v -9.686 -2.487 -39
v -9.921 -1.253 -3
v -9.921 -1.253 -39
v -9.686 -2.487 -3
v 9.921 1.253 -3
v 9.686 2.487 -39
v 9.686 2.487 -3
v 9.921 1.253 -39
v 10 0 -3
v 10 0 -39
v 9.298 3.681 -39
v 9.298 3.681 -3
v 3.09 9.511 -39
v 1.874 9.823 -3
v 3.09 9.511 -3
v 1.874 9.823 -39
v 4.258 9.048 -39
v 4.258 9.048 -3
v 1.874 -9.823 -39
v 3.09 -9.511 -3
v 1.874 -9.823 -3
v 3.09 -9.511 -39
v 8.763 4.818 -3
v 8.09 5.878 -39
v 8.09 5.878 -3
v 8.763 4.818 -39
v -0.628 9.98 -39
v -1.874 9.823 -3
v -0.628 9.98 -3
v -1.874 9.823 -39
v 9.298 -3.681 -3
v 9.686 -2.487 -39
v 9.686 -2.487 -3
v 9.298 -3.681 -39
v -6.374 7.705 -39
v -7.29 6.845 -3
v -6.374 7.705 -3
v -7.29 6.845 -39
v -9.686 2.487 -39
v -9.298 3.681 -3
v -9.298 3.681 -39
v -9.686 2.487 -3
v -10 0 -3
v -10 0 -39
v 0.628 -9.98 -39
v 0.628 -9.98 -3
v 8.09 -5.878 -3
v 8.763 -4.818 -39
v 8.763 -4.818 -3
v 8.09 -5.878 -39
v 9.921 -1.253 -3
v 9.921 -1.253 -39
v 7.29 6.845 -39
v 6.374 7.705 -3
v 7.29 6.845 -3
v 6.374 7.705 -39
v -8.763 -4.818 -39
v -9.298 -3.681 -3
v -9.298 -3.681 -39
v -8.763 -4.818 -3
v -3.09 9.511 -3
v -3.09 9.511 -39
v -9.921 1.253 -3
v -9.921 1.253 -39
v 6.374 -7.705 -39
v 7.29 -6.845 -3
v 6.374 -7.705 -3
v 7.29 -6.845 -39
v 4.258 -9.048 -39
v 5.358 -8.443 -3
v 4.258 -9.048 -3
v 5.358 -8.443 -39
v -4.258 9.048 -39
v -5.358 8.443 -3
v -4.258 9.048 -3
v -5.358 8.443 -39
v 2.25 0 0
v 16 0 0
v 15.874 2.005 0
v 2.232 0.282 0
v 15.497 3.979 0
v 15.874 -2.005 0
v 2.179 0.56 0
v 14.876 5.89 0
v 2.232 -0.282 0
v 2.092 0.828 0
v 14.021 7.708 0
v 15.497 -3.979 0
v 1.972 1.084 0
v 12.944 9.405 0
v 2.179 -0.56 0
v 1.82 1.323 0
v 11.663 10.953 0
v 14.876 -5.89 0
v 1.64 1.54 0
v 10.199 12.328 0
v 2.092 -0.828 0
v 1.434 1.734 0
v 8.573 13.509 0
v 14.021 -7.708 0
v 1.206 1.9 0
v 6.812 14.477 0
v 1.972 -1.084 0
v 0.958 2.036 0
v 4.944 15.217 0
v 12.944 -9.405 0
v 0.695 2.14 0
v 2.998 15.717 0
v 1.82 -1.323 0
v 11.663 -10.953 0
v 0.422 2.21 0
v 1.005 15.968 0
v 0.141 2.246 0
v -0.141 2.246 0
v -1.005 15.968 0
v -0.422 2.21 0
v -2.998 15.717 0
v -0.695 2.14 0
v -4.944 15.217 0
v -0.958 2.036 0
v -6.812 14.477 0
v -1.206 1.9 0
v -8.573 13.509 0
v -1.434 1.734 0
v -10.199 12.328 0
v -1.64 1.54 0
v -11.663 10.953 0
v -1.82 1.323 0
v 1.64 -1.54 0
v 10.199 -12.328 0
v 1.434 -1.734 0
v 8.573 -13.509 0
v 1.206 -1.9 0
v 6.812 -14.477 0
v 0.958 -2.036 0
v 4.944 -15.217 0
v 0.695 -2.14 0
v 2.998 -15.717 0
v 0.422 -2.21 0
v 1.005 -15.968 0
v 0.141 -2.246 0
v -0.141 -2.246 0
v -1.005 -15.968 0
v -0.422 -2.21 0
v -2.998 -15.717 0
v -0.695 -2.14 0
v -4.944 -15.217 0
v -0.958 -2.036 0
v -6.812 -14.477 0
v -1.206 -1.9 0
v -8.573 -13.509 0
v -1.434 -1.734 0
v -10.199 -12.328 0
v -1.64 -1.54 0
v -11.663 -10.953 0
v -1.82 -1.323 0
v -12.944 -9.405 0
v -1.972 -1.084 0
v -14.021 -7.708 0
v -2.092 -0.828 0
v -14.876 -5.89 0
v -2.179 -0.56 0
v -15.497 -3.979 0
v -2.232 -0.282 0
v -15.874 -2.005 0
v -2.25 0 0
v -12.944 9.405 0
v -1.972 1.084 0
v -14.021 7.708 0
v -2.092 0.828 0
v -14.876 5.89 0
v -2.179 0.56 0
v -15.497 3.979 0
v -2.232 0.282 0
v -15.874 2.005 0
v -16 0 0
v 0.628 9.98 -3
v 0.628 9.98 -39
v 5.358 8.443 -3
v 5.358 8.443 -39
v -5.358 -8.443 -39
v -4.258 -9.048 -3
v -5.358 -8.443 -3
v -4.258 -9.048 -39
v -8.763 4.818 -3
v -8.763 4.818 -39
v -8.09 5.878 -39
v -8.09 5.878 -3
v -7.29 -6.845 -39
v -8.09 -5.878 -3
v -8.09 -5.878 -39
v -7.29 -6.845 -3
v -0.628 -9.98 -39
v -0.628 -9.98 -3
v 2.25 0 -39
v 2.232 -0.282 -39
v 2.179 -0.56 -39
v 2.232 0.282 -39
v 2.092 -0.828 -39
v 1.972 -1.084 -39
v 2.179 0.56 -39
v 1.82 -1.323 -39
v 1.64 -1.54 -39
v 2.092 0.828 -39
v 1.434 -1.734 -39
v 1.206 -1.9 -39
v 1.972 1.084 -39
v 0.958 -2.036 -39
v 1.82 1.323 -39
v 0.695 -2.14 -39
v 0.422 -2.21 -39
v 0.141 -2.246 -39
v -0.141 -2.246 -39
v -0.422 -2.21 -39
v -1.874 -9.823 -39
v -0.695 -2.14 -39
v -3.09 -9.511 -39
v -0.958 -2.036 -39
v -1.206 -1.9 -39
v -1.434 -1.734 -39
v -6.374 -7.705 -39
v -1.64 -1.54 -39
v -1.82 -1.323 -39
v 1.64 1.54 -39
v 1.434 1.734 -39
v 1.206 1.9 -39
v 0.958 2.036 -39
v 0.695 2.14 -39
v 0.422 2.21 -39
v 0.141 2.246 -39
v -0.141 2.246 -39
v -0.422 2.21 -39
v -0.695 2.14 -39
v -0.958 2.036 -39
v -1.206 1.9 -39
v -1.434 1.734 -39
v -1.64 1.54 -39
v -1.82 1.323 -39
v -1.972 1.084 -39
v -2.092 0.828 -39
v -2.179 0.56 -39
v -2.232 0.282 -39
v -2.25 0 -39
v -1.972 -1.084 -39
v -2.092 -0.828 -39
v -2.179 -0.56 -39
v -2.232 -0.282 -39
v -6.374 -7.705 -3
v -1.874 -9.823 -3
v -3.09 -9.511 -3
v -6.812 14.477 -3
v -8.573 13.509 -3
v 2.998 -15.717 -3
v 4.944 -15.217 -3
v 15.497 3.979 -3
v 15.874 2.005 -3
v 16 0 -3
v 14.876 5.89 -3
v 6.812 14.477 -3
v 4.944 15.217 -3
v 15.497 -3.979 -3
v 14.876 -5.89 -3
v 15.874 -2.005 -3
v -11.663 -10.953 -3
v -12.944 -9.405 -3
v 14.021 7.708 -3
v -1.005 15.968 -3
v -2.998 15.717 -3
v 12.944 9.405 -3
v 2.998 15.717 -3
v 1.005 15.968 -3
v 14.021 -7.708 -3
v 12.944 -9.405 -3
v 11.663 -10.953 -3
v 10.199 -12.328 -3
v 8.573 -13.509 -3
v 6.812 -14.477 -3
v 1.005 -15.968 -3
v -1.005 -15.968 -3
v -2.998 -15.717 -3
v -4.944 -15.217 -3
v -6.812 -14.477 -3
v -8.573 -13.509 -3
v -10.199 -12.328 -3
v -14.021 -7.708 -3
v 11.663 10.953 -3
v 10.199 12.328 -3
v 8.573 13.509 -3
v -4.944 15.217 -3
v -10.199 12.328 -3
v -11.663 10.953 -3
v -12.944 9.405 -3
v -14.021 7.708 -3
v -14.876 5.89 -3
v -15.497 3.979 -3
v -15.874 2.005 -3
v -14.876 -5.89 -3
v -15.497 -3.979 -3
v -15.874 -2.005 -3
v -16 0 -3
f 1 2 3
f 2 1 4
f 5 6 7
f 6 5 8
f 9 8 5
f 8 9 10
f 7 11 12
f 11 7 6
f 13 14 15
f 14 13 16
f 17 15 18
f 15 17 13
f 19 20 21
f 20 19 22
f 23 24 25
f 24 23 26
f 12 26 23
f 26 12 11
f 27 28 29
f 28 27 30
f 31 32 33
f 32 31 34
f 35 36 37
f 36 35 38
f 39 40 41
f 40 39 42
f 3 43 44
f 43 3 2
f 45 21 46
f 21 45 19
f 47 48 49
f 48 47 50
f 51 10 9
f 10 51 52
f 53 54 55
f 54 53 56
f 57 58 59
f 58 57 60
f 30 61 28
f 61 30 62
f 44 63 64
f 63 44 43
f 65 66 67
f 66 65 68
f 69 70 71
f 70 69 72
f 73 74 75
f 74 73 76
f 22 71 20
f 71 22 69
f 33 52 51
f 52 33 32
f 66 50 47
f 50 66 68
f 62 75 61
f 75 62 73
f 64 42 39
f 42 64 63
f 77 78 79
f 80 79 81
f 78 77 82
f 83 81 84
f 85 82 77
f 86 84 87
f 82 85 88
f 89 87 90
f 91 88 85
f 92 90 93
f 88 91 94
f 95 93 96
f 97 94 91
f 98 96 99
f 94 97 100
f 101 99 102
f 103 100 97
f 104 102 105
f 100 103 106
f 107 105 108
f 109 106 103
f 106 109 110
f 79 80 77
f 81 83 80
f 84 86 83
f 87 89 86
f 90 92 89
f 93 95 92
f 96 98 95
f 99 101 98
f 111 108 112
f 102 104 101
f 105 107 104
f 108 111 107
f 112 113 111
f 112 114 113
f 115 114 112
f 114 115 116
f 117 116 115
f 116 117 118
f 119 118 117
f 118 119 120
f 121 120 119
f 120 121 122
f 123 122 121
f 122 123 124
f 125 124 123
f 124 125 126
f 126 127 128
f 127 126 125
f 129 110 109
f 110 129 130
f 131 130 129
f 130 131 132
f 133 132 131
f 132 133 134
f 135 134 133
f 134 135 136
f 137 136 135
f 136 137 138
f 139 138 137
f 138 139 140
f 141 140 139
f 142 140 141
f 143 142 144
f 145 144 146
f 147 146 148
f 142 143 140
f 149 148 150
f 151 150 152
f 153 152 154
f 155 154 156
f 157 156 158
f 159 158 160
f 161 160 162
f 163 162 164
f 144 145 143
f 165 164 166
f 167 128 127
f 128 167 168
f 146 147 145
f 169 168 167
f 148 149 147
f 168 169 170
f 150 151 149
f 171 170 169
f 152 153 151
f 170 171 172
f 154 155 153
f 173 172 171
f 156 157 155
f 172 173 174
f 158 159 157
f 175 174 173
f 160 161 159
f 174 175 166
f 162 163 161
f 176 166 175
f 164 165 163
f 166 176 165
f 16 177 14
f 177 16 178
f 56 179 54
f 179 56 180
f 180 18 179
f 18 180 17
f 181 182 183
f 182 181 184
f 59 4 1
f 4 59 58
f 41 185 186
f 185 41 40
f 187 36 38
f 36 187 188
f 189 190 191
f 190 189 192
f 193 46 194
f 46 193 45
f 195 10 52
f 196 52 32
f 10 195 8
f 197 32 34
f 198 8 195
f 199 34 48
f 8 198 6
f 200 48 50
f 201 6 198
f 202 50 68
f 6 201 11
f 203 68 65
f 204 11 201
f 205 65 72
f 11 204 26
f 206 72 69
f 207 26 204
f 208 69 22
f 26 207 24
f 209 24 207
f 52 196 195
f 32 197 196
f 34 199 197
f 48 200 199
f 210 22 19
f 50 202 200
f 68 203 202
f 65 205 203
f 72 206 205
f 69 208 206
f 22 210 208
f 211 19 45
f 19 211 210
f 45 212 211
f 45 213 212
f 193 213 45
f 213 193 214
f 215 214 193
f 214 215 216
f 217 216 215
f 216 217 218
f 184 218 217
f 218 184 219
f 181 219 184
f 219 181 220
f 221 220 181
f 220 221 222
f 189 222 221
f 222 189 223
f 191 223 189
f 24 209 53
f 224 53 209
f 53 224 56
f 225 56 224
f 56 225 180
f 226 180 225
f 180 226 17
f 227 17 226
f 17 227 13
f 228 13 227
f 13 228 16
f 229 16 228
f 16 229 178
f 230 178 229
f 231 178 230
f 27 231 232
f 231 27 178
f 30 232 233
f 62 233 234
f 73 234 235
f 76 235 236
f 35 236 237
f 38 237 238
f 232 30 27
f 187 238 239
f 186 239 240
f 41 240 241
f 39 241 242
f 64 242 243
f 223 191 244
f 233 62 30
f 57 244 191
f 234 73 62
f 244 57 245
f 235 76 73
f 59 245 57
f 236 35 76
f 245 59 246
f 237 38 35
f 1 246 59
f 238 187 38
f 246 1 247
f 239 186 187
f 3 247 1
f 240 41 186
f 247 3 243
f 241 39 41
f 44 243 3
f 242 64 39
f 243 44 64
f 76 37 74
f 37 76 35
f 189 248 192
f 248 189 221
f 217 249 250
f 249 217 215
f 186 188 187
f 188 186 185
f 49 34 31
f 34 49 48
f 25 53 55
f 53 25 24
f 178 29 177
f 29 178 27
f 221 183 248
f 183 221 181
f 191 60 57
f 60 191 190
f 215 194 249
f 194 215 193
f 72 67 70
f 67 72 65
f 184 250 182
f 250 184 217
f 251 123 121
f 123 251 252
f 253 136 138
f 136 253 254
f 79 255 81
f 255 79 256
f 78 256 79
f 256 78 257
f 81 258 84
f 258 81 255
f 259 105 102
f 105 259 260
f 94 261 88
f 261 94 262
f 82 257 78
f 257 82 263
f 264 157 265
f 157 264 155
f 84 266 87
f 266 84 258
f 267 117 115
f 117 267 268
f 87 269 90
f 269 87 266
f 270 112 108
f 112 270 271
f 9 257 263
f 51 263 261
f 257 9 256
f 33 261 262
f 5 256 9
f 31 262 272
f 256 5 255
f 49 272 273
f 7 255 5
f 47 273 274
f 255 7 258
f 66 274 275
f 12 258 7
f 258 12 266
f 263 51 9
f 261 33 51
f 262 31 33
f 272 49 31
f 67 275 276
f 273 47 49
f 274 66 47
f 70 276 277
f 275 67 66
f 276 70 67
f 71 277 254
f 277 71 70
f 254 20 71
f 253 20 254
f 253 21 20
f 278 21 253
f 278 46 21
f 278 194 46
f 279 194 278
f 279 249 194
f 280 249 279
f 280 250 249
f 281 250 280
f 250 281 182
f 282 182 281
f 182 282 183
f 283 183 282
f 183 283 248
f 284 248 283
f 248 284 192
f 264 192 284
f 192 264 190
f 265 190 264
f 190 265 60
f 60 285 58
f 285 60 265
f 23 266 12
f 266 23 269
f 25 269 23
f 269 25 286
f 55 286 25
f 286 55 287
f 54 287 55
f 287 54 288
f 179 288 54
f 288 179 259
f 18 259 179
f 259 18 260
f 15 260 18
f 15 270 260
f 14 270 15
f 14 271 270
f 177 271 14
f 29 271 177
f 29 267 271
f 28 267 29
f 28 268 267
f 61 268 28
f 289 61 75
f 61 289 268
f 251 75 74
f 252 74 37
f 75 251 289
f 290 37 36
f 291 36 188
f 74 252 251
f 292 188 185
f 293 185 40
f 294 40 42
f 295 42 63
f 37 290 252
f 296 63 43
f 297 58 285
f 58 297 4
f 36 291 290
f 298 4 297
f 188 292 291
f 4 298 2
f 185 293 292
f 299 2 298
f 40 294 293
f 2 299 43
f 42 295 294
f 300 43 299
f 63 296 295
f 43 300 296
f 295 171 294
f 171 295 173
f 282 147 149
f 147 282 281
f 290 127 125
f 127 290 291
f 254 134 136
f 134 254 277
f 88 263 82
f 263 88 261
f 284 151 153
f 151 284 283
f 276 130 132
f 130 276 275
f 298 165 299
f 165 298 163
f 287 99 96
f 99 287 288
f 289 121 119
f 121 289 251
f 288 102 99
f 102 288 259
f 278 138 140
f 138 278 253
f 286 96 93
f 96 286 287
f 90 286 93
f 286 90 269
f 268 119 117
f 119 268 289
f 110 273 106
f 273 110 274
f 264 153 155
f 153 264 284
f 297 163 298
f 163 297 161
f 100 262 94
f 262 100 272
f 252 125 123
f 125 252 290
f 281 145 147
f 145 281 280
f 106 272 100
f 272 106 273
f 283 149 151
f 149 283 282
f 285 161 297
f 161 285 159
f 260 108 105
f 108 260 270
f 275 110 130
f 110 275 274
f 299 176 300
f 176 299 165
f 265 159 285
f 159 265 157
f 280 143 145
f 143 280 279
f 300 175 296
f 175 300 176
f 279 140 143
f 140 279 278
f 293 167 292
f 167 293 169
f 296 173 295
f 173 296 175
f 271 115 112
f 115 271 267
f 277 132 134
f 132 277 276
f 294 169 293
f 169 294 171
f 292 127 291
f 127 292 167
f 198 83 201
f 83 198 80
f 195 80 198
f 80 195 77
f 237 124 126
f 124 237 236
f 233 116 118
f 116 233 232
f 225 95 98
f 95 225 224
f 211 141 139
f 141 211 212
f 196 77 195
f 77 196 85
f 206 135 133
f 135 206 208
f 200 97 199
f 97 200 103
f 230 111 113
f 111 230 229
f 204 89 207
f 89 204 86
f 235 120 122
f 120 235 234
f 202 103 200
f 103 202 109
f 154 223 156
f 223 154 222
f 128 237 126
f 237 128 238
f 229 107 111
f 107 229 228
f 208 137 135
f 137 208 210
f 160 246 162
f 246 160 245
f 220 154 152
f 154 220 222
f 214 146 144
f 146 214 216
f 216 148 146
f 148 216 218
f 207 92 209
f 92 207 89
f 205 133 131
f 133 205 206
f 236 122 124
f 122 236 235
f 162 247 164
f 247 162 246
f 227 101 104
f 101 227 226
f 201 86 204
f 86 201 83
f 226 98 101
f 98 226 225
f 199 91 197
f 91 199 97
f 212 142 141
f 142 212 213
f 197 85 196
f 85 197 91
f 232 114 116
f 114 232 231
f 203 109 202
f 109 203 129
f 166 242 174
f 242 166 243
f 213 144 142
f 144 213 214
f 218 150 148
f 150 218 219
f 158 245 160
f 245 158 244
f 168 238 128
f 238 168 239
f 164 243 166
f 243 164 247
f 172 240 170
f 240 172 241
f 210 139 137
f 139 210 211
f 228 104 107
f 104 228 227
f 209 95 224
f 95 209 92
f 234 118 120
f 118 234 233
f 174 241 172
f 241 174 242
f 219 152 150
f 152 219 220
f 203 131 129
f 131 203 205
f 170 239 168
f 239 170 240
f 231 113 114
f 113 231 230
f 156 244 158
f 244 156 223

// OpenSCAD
$fn = 50;


difference() {
	union() {
		translate(v = [0, 0, -39.0000000000]) {
			cylinder(h = 39, r = 10.0000000000);
		}
		translate(v = [0, 0, -3.0000000000]) {
			cylinder(h = 3, r = 16.0000000000);
		}
	}
	union() {
		#translate(v = [0, 0, -39]) {
			cylinder(h = 39, r = 2.2500000000);
		}
	}
}
